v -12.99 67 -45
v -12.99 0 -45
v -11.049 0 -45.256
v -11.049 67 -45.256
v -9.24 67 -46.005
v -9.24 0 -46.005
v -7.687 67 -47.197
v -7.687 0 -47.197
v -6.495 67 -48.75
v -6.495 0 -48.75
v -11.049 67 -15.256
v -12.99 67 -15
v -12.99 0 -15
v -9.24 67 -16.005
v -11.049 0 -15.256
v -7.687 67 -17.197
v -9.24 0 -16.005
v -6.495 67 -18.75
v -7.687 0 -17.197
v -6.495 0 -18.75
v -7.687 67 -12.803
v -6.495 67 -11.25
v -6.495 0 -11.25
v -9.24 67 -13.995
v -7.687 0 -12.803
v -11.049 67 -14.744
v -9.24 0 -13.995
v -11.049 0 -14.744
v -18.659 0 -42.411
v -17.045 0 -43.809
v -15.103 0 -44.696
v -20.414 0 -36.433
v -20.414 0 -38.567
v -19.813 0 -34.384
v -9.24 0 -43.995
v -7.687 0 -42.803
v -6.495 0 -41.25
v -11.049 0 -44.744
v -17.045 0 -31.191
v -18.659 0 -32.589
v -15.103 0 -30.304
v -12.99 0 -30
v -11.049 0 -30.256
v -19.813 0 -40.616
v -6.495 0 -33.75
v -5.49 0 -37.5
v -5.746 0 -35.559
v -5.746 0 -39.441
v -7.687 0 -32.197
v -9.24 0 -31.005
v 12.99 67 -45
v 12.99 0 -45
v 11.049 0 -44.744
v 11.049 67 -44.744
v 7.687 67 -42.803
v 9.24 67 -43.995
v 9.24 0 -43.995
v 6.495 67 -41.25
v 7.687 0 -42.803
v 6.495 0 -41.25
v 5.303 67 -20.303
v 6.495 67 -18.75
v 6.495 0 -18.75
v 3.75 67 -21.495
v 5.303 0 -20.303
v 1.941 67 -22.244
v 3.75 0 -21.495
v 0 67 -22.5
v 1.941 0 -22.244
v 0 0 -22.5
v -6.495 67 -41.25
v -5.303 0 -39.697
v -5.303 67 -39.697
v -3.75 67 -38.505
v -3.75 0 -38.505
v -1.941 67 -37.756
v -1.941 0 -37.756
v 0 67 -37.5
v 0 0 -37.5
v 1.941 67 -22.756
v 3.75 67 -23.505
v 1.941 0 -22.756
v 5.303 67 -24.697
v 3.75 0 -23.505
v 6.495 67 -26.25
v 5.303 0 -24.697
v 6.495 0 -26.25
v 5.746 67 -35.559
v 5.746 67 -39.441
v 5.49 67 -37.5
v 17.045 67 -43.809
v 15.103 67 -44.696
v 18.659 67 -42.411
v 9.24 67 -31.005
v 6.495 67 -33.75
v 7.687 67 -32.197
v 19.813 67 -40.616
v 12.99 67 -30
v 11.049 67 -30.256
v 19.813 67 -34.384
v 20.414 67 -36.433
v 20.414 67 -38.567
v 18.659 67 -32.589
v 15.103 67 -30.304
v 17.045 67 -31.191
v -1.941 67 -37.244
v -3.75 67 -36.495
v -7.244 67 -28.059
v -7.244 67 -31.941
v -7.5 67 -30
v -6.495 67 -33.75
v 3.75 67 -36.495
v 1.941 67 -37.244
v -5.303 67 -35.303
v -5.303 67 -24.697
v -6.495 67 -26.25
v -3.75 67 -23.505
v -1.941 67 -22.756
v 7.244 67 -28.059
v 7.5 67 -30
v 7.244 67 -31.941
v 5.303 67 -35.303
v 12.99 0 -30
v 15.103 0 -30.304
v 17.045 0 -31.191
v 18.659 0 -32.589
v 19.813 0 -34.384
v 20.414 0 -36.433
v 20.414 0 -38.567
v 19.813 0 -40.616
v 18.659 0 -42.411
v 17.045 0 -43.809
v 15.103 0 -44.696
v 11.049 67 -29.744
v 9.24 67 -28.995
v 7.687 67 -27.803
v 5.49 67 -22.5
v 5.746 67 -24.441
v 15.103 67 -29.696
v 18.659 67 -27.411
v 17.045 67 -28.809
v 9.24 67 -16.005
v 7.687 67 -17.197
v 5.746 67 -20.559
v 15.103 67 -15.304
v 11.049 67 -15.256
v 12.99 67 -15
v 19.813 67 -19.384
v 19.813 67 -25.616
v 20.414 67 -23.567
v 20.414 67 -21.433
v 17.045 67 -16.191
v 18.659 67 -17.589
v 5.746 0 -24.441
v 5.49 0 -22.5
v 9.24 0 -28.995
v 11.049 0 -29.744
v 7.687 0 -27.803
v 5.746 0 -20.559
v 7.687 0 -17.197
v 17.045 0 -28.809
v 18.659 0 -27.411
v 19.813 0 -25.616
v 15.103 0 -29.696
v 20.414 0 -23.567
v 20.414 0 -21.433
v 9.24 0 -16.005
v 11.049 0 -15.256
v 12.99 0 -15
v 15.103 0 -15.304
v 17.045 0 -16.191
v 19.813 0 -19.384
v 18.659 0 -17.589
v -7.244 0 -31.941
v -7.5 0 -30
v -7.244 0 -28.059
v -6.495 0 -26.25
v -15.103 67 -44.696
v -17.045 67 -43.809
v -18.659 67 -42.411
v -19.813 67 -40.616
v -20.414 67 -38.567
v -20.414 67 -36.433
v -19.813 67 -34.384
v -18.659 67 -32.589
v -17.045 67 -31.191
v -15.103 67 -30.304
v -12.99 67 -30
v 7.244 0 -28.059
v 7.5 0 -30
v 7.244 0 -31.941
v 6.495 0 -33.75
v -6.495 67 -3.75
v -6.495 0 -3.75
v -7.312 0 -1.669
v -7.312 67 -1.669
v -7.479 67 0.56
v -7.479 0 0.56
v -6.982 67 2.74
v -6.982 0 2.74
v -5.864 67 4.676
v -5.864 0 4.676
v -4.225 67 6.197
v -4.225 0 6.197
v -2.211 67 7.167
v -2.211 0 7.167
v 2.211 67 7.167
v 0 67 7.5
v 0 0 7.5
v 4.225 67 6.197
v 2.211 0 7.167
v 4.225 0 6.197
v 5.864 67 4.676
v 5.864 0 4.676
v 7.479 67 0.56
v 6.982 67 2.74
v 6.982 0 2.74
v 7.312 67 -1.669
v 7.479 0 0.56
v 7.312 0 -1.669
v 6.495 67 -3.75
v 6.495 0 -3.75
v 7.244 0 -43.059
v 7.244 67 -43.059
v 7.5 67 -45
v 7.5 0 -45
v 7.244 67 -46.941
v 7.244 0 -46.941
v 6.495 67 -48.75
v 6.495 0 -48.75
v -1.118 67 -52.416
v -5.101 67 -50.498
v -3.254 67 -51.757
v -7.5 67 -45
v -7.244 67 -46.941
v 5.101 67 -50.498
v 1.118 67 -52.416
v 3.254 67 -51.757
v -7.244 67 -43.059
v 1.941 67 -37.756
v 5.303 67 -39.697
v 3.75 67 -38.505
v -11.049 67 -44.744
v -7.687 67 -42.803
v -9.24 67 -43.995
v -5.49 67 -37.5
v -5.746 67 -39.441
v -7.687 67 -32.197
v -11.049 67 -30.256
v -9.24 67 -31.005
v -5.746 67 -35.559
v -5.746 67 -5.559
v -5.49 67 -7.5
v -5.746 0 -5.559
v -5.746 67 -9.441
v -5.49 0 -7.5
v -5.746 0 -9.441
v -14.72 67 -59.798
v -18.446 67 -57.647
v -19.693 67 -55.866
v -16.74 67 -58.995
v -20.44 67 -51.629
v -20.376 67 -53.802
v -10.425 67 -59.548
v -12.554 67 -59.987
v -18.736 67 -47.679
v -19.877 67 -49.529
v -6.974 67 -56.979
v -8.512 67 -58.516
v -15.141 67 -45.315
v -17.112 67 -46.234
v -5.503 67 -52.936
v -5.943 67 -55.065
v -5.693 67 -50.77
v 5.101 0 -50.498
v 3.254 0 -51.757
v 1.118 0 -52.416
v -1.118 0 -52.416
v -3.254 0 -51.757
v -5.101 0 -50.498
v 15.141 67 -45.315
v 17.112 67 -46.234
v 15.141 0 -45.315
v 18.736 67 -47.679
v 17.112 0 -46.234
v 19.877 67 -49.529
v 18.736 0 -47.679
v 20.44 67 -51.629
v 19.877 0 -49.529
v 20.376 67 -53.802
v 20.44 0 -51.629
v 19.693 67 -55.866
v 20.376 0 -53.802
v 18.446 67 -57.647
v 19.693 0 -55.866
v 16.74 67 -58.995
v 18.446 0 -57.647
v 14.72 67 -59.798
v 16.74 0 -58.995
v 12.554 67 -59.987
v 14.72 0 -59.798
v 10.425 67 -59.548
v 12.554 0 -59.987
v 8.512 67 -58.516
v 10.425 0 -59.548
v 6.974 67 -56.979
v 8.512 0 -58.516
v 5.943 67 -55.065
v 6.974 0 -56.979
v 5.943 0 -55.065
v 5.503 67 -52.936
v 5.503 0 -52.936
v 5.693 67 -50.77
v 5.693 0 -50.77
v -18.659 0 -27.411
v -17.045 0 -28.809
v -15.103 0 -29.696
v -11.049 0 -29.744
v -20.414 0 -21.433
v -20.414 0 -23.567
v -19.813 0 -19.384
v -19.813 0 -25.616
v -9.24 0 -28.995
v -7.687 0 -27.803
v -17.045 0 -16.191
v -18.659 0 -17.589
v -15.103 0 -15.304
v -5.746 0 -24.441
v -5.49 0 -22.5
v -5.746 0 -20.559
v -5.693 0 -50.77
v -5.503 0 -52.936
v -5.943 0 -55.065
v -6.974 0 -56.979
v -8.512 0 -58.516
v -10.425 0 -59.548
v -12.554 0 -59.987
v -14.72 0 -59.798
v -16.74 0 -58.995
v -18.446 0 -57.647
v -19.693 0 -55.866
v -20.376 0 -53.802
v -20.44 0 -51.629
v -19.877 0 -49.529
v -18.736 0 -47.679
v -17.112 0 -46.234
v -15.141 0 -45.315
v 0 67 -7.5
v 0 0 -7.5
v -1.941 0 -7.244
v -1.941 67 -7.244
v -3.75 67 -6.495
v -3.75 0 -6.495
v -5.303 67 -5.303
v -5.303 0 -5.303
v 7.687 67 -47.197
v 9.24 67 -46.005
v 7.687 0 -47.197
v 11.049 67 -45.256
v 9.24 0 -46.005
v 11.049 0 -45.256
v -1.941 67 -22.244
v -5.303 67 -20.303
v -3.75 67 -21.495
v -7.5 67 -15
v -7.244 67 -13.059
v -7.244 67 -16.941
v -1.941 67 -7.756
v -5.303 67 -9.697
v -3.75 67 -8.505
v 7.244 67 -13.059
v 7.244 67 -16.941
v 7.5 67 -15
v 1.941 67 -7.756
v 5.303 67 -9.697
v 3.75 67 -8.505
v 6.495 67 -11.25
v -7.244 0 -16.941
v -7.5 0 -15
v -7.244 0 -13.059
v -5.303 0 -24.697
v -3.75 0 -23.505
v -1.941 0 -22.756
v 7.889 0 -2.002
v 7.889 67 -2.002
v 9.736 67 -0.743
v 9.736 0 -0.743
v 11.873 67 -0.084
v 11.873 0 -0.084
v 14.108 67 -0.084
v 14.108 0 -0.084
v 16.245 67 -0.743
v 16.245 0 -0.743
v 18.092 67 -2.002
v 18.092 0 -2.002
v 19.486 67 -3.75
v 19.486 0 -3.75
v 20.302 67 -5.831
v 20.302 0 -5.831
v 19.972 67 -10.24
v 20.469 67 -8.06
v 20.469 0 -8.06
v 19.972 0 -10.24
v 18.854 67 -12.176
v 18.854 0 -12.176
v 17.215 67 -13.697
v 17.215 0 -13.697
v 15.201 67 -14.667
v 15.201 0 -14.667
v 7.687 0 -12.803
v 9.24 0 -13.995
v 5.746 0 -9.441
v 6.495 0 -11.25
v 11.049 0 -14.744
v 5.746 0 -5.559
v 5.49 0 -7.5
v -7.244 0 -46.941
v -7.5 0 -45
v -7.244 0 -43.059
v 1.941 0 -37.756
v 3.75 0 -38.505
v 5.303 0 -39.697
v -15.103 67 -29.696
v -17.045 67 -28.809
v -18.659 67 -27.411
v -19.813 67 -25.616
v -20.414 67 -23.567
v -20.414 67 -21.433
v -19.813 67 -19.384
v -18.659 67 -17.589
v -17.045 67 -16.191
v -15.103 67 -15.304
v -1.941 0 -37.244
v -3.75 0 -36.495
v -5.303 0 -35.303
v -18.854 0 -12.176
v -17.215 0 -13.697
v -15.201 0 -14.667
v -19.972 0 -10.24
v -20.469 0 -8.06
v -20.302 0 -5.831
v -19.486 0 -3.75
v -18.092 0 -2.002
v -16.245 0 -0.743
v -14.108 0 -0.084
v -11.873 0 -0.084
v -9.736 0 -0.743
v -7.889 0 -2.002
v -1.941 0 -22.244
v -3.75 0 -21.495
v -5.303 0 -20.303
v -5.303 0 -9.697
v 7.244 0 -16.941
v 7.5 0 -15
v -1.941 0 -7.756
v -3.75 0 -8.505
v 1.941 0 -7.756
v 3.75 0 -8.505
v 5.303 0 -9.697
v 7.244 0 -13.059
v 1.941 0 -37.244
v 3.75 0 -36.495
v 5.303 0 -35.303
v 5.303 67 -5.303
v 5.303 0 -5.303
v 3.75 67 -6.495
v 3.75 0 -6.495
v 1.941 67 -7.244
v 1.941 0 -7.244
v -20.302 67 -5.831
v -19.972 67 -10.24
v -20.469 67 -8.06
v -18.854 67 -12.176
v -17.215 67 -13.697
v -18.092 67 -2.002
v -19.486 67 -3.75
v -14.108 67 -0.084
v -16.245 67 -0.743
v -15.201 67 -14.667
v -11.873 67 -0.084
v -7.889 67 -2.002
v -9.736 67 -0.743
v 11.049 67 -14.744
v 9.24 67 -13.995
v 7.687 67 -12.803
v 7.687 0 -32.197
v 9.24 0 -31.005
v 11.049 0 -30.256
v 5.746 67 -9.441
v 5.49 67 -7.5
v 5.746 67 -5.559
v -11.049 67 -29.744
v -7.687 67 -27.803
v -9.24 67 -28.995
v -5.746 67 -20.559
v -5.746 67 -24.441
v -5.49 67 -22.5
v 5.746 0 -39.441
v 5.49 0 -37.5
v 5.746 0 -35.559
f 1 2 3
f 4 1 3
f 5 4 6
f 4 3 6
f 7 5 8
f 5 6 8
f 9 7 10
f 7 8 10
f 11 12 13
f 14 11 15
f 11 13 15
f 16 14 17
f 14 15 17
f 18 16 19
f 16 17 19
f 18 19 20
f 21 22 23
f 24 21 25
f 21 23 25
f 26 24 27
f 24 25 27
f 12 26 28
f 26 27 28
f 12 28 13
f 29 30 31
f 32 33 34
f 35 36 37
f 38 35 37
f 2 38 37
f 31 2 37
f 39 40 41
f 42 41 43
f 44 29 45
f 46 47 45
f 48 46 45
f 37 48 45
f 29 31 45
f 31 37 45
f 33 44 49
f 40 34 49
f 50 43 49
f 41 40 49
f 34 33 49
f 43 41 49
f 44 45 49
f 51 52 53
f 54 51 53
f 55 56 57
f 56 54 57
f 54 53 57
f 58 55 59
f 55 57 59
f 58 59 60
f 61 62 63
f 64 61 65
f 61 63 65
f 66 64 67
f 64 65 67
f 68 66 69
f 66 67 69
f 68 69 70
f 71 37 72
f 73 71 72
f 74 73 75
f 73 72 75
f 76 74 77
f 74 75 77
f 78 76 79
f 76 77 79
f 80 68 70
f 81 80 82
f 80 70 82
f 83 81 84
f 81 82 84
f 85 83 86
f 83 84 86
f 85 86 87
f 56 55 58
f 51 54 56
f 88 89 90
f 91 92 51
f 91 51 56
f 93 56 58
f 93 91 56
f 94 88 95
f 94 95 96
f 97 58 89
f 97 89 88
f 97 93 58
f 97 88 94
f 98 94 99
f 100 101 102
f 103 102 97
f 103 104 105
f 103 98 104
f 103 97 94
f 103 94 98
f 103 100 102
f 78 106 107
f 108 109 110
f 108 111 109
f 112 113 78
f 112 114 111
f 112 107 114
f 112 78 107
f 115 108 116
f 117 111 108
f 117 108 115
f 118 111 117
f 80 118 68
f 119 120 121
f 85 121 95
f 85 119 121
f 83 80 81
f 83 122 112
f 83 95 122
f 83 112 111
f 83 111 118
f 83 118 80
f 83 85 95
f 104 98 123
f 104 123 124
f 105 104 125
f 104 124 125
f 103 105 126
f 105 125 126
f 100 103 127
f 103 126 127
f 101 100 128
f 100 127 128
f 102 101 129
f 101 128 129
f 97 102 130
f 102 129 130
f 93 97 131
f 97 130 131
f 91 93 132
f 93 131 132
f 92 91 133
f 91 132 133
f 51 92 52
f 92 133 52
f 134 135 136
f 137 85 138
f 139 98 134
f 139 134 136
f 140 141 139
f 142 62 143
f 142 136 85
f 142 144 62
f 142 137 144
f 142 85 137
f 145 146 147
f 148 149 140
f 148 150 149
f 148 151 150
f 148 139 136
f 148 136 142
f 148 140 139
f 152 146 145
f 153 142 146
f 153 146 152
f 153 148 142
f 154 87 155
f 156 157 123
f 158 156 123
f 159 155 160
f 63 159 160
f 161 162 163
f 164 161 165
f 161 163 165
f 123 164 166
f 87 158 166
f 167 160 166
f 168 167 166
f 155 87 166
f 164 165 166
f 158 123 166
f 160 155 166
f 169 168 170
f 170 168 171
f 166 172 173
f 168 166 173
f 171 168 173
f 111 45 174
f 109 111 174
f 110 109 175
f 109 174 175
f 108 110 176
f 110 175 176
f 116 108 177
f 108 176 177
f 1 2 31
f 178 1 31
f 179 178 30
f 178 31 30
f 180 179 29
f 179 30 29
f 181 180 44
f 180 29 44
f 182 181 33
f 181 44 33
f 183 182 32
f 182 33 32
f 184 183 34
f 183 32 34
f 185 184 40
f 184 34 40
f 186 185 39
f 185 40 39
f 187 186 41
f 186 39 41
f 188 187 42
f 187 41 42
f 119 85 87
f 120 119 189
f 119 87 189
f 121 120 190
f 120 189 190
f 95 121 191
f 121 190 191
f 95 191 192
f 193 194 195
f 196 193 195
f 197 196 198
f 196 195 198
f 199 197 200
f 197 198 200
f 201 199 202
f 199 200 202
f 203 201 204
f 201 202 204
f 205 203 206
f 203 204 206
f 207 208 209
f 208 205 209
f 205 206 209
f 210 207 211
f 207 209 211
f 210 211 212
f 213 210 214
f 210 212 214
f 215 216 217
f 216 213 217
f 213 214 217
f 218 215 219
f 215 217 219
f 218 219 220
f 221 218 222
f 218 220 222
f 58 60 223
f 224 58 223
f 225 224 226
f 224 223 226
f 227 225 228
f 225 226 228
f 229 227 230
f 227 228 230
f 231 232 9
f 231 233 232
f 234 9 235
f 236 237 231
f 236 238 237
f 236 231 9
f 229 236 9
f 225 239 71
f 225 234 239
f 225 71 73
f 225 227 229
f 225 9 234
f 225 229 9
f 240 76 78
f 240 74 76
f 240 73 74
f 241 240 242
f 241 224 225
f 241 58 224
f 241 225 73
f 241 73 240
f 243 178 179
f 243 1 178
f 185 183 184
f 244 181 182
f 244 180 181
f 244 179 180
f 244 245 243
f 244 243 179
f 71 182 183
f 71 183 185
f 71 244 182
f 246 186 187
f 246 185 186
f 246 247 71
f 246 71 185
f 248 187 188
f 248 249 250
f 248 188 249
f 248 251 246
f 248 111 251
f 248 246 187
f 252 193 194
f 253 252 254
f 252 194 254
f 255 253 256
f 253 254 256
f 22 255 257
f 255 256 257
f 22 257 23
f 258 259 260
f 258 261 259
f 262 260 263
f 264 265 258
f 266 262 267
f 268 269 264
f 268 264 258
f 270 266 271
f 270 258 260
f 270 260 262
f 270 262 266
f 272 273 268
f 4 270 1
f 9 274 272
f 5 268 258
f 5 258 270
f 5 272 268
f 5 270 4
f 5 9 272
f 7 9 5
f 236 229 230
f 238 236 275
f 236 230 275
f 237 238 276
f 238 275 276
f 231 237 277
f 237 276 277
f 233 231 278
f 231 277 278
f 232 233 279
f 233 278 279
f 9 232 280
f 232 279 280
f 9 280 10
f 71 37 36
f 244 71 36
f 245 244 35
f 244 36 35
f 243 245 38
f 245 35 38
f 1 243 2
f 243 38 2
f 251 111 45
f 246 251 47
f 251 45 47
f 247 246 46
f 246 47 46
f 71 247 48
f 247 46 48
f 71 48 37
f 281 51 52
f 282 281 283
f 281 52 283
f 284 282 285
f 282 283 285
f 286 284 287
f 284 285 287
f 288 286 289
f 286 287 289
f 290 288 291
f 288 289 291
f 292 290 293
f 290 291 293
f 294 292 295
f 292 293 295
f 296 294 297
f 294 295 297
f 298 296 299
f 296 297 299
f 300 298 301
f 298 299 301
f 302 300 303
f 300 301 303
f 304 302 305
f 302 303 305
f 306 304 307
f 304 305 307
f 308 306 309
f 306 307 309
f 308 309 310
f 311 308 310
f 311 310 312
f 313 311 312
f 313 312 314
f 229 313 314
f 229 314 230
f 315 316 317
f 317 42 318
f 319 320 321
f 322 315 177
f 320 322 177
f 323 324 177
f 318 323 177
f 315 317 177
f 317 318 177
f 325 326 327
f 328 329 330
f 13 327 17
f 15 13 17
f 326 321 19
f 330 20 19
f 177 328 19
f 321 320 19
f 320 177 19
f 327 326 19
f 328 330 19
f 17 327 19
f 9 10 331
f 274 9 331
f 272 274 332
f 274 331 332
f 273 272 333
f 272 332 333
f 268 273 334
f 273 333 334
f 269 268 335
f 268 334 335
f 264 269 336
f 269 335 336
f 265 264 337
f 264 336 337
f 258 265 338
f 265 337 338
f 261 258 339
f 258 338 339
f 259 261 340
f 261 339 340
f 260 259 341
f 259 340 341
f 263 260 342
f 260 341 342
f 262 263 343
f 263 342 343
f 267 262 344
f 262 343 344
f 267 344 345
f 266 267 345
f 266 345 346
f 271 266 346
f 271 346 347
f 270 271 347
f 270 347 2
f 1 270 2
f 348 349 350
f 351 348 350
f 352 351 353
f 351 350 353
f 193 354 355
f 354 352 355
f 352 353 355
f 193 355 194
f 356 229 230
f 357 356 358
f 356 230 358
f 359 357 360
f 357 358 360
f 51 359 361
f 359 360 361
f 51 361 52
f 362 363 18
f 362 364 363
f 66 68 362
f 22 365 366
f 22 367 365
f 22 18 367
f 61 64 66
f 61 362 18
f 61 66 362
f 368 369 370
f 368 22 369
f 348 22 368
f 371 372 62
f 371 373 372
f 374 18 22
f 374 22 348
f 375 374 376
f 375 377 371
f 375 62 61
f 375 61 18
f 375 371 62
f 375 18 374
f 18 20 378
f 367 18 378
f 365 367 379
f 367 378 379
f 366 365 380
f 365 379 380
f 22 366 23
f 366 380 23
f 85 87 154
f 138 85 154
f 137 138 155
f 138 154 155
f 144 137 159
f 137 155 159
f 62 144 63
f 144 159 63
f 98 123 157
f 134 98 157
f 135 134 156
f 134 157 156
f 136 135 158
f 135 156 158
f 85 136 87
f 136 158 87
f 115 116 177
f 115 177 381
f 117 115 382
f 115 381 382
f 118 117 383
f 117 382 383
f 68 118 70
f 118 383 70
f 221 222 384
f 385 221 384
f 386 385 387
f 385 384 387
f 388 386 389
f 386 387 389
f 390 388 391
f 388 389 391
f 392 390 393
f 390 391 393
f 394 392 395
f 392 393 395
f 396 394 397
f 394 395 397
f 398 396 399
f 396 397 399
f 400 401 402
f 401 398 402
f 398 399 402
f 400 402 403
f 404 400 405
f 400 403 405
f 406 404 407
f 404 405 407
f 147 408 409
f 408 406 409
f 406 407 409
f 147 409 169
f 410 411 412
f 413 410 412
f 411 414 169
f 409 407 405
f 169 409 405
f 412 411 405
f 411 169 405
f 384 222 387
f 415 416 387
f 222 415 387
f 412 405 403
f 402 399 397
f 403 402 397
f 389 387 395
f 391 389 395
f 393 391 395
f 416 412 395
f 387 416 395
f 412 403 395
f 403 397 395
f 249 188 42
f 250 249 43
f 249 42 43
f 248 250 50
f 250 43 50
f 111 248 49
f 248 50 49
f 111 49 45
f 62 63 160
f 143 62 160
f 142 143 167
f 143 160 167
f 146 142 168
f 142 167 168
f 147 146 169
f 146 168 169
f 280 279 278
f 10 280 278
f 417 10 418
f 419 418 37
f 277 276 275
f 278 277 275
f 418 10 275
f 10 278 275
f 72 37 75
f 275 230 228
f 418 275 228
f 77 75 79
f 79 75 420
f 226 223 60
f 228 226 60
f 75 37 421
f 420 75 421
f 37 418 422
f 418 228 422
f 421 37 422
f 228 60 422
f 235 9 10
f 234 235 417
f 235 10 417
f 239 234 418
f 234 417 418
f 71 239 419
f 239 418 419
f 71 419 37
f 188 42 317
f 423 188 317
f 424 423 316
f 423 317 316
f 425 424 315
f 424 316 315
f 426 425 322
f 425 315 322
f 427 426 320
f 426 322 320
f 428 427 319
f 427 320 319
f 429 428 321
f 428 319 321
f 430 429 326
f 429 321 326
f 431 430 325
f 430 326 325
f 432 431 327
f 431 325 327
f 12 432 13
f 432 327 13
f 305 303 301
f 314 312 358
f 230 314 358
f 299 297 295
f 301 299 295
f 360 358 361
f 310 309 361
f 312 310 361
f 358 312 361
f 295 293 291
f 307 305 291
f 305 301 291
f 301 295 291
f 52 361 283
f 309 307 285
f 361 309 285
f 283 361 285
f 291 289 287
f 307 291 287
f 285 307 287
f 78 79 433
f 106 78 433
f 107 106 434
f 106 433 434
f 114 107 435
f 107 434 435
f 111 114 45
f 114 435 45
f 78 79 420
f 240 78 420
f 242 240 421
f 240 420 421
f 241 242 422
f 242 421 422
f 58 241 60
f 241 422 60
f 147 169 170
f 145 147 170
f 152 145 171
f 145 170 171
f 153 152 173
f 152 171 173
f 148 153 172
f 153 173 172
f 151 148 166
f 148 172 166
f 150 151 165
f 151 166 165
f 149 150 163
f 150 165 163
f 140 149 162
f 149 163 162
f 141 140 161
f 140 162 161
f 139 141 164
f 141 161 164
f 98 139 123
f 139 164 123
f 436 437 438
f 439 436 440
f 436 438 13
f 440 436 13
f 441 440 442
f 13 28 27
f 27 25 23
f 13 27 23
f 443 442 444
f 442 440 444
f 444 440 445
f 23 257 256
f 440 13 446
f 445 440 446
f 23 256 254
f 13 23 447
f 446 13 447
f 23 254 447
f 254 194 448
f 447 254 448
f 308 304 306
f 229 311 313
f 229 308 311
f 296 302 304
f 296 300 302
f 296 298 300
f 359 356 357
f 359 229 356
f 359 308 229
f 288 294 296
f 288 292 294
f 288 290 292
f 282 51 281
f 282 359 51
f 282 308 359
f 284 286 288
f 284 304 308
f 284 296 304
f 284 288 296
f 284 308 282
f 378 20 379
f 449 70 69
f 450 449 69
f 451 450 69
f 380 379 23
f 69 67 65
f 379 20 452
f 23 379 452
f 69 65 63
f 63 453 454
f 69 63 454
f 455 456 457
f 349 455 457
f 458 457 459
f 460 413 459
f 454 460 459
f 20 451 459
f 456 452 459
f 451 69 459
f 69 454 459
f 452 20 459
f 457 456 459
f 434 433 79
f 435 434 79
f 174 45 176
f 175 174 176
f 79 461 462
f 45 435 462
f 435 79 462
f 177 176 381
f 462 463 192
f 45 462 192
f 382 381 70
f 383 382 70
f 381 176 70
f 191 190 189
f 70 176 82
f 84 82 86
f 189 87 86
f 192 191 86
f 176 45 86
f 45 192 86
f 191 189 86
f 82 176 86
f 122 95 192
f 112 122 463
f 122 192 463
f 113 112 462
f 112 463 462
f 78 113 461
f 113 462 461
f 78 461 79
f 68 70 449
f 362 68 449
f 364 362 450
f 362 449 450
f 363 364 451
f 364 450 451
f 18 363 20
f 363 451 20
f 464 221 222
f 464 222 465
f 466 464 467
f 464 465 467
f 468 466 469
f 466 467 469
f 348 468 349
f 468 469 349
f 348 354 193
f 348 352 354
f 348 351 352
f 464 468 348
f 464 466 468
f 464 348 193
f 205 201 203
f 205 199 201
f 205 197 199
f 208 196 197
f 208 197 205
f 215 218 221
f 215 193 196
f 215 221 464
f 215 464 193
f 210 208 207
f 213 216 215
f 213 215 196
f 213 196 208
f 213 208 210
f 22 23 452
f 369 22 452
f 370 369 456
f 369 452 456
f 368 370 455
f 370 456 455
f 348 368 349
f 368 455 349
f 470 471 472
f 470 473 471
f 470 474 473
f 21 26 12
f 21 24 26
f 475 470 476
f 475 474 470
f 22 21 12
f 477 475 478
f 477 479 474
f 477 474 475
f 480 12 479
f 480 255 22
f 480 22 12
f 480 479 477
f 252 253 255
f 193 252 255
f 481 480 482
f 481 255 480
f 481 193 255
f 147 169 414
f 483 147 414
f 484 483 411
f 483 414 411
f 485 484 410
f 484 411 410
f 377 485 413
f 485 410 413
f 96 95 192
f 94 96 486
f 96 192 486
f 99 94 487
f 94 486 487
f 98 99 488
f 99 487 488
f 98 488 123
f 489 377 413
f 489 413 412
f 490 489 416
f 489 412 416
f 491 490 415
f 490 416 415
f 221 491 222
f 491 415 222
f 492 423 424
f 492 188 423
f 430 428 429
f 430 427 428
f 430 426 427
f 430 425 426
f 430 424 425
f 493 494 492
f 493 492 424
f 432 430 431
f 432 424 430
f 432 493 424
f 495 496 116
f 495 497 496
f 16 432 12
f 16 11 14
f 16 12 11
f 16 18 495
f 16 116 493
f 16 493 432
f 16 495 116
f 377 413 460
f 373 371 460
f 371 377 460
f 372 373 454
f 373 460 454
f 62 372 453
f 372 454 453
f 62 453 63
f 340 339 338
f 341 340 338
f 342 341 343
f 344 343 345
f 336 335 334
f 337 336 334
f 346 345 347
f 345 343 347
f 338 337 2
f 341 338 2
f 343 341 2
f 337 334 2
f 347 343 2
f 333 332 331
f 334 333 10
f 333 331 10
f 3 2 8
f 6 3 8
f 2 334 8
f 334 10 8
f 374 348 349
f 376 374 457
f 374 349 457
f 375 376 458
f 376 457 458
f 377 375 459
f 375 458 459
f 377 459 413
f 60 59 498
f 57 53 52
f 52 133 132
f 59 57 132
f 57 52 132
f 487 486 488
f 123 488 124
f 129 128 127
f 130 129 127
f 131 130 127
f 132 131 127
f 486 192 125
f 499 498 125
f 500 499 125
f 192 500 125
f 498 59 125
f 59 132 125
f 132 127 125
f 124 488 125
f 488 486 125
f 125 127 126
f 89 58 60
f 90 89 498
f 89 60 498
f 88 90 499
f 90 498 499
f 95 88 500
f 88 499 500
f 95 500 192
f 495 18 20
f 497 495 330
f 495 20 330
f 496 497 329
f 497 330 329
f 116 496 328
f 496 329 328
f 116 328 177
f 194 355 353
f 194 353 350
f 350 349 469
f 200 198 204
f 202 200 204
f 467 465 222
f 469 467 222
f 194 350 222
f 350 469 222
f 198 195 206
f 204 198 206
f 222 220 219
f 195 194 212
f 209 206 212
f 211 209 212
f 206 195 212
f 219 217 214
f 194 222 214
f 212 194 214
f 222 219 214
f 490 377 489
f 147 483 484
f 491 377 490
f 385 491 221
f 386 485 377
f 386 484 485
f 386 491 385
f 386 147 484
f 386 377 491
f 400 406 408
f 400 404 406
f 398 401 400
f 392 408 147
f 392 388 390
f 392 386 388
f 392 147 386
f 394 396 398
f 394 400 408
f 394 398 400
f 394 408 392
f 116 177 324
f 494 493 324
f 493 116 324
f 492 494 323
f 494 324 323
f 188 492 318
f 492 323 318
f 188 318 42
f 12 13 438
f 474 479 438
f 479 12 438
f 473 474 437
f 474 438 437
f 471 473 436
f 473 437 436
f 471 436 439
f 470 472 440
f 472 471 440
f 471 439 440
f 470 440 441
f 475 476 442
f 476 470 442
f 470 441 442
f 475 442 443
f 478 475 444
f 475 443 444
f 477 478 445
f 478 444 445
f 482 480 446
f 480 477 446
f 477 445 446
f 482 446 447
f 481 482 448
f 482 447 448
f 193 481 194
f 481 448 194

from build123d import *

# Parameters (mm, degrees)
SKETCH1_R           = 7.5
BOSS_EXTRUDE1_DEPTH = 67


with BuildPart() as part:
    # Sketch1 → Boss-Extrude1 (new body)
    with BuildSketch(Plane(origin=(0, 0, 0), x_dir=(1, 0, 0), z_dir=(0, 1, 0))):
        with Locations(Location((12.990381057, 7.5, 0), (0, 0, 270))):
            Circle(SKETCH1_R)
        with Locations(Location((0, 0, 0), (0, 0, 270))):
            Circle(SKETCH1_R)
        with Locations(Location((0, 15, 0), (0, 0, 270))):
            Circle(SKETCH1_R)
        with Locations(Location((-12.990381057, 7.5, 0), (0, 0, 270))):
            Circle(SKETCH1_R)
        with Locations(Location((-12.990381057, 22.5, 0), (0, 0, 270))):
            Circle(SKETCH1_R)
        with Locations(Location((-12.990381057, 37.5, 0), (0, 0, 270))):
            Circle(SKETCH1_R)
        with Locations(Location((-12.990381057, 52.5, 0), (0, 0, 270))):
            Circle(SKETCH1_R)
        with Locations(Location((0, 45, 0), (0, 0, 270))):
            Circle(SKETCH1_R)
        with Locations(Location((0, 30, 0), (0, 0, 270))):
            Circle(SKETCH1_R)
        with Locations(Location((12.990381057, 52.5, 0), (0, 0, 270))):
            Circle(SKETCH1_R)
        with Locations(Location((12.990381057, 37.5, 0), (0, 0, 270))):
            Circle(SKETCH1_R)
        with Locations(Location((12.990381057, 22.5, 0), (0, 0, 270))):
            Circle(SKETCH1_R)
    extrude(amount=BOSS_EXTRUDE1_DEPTH)


solid = part.part
